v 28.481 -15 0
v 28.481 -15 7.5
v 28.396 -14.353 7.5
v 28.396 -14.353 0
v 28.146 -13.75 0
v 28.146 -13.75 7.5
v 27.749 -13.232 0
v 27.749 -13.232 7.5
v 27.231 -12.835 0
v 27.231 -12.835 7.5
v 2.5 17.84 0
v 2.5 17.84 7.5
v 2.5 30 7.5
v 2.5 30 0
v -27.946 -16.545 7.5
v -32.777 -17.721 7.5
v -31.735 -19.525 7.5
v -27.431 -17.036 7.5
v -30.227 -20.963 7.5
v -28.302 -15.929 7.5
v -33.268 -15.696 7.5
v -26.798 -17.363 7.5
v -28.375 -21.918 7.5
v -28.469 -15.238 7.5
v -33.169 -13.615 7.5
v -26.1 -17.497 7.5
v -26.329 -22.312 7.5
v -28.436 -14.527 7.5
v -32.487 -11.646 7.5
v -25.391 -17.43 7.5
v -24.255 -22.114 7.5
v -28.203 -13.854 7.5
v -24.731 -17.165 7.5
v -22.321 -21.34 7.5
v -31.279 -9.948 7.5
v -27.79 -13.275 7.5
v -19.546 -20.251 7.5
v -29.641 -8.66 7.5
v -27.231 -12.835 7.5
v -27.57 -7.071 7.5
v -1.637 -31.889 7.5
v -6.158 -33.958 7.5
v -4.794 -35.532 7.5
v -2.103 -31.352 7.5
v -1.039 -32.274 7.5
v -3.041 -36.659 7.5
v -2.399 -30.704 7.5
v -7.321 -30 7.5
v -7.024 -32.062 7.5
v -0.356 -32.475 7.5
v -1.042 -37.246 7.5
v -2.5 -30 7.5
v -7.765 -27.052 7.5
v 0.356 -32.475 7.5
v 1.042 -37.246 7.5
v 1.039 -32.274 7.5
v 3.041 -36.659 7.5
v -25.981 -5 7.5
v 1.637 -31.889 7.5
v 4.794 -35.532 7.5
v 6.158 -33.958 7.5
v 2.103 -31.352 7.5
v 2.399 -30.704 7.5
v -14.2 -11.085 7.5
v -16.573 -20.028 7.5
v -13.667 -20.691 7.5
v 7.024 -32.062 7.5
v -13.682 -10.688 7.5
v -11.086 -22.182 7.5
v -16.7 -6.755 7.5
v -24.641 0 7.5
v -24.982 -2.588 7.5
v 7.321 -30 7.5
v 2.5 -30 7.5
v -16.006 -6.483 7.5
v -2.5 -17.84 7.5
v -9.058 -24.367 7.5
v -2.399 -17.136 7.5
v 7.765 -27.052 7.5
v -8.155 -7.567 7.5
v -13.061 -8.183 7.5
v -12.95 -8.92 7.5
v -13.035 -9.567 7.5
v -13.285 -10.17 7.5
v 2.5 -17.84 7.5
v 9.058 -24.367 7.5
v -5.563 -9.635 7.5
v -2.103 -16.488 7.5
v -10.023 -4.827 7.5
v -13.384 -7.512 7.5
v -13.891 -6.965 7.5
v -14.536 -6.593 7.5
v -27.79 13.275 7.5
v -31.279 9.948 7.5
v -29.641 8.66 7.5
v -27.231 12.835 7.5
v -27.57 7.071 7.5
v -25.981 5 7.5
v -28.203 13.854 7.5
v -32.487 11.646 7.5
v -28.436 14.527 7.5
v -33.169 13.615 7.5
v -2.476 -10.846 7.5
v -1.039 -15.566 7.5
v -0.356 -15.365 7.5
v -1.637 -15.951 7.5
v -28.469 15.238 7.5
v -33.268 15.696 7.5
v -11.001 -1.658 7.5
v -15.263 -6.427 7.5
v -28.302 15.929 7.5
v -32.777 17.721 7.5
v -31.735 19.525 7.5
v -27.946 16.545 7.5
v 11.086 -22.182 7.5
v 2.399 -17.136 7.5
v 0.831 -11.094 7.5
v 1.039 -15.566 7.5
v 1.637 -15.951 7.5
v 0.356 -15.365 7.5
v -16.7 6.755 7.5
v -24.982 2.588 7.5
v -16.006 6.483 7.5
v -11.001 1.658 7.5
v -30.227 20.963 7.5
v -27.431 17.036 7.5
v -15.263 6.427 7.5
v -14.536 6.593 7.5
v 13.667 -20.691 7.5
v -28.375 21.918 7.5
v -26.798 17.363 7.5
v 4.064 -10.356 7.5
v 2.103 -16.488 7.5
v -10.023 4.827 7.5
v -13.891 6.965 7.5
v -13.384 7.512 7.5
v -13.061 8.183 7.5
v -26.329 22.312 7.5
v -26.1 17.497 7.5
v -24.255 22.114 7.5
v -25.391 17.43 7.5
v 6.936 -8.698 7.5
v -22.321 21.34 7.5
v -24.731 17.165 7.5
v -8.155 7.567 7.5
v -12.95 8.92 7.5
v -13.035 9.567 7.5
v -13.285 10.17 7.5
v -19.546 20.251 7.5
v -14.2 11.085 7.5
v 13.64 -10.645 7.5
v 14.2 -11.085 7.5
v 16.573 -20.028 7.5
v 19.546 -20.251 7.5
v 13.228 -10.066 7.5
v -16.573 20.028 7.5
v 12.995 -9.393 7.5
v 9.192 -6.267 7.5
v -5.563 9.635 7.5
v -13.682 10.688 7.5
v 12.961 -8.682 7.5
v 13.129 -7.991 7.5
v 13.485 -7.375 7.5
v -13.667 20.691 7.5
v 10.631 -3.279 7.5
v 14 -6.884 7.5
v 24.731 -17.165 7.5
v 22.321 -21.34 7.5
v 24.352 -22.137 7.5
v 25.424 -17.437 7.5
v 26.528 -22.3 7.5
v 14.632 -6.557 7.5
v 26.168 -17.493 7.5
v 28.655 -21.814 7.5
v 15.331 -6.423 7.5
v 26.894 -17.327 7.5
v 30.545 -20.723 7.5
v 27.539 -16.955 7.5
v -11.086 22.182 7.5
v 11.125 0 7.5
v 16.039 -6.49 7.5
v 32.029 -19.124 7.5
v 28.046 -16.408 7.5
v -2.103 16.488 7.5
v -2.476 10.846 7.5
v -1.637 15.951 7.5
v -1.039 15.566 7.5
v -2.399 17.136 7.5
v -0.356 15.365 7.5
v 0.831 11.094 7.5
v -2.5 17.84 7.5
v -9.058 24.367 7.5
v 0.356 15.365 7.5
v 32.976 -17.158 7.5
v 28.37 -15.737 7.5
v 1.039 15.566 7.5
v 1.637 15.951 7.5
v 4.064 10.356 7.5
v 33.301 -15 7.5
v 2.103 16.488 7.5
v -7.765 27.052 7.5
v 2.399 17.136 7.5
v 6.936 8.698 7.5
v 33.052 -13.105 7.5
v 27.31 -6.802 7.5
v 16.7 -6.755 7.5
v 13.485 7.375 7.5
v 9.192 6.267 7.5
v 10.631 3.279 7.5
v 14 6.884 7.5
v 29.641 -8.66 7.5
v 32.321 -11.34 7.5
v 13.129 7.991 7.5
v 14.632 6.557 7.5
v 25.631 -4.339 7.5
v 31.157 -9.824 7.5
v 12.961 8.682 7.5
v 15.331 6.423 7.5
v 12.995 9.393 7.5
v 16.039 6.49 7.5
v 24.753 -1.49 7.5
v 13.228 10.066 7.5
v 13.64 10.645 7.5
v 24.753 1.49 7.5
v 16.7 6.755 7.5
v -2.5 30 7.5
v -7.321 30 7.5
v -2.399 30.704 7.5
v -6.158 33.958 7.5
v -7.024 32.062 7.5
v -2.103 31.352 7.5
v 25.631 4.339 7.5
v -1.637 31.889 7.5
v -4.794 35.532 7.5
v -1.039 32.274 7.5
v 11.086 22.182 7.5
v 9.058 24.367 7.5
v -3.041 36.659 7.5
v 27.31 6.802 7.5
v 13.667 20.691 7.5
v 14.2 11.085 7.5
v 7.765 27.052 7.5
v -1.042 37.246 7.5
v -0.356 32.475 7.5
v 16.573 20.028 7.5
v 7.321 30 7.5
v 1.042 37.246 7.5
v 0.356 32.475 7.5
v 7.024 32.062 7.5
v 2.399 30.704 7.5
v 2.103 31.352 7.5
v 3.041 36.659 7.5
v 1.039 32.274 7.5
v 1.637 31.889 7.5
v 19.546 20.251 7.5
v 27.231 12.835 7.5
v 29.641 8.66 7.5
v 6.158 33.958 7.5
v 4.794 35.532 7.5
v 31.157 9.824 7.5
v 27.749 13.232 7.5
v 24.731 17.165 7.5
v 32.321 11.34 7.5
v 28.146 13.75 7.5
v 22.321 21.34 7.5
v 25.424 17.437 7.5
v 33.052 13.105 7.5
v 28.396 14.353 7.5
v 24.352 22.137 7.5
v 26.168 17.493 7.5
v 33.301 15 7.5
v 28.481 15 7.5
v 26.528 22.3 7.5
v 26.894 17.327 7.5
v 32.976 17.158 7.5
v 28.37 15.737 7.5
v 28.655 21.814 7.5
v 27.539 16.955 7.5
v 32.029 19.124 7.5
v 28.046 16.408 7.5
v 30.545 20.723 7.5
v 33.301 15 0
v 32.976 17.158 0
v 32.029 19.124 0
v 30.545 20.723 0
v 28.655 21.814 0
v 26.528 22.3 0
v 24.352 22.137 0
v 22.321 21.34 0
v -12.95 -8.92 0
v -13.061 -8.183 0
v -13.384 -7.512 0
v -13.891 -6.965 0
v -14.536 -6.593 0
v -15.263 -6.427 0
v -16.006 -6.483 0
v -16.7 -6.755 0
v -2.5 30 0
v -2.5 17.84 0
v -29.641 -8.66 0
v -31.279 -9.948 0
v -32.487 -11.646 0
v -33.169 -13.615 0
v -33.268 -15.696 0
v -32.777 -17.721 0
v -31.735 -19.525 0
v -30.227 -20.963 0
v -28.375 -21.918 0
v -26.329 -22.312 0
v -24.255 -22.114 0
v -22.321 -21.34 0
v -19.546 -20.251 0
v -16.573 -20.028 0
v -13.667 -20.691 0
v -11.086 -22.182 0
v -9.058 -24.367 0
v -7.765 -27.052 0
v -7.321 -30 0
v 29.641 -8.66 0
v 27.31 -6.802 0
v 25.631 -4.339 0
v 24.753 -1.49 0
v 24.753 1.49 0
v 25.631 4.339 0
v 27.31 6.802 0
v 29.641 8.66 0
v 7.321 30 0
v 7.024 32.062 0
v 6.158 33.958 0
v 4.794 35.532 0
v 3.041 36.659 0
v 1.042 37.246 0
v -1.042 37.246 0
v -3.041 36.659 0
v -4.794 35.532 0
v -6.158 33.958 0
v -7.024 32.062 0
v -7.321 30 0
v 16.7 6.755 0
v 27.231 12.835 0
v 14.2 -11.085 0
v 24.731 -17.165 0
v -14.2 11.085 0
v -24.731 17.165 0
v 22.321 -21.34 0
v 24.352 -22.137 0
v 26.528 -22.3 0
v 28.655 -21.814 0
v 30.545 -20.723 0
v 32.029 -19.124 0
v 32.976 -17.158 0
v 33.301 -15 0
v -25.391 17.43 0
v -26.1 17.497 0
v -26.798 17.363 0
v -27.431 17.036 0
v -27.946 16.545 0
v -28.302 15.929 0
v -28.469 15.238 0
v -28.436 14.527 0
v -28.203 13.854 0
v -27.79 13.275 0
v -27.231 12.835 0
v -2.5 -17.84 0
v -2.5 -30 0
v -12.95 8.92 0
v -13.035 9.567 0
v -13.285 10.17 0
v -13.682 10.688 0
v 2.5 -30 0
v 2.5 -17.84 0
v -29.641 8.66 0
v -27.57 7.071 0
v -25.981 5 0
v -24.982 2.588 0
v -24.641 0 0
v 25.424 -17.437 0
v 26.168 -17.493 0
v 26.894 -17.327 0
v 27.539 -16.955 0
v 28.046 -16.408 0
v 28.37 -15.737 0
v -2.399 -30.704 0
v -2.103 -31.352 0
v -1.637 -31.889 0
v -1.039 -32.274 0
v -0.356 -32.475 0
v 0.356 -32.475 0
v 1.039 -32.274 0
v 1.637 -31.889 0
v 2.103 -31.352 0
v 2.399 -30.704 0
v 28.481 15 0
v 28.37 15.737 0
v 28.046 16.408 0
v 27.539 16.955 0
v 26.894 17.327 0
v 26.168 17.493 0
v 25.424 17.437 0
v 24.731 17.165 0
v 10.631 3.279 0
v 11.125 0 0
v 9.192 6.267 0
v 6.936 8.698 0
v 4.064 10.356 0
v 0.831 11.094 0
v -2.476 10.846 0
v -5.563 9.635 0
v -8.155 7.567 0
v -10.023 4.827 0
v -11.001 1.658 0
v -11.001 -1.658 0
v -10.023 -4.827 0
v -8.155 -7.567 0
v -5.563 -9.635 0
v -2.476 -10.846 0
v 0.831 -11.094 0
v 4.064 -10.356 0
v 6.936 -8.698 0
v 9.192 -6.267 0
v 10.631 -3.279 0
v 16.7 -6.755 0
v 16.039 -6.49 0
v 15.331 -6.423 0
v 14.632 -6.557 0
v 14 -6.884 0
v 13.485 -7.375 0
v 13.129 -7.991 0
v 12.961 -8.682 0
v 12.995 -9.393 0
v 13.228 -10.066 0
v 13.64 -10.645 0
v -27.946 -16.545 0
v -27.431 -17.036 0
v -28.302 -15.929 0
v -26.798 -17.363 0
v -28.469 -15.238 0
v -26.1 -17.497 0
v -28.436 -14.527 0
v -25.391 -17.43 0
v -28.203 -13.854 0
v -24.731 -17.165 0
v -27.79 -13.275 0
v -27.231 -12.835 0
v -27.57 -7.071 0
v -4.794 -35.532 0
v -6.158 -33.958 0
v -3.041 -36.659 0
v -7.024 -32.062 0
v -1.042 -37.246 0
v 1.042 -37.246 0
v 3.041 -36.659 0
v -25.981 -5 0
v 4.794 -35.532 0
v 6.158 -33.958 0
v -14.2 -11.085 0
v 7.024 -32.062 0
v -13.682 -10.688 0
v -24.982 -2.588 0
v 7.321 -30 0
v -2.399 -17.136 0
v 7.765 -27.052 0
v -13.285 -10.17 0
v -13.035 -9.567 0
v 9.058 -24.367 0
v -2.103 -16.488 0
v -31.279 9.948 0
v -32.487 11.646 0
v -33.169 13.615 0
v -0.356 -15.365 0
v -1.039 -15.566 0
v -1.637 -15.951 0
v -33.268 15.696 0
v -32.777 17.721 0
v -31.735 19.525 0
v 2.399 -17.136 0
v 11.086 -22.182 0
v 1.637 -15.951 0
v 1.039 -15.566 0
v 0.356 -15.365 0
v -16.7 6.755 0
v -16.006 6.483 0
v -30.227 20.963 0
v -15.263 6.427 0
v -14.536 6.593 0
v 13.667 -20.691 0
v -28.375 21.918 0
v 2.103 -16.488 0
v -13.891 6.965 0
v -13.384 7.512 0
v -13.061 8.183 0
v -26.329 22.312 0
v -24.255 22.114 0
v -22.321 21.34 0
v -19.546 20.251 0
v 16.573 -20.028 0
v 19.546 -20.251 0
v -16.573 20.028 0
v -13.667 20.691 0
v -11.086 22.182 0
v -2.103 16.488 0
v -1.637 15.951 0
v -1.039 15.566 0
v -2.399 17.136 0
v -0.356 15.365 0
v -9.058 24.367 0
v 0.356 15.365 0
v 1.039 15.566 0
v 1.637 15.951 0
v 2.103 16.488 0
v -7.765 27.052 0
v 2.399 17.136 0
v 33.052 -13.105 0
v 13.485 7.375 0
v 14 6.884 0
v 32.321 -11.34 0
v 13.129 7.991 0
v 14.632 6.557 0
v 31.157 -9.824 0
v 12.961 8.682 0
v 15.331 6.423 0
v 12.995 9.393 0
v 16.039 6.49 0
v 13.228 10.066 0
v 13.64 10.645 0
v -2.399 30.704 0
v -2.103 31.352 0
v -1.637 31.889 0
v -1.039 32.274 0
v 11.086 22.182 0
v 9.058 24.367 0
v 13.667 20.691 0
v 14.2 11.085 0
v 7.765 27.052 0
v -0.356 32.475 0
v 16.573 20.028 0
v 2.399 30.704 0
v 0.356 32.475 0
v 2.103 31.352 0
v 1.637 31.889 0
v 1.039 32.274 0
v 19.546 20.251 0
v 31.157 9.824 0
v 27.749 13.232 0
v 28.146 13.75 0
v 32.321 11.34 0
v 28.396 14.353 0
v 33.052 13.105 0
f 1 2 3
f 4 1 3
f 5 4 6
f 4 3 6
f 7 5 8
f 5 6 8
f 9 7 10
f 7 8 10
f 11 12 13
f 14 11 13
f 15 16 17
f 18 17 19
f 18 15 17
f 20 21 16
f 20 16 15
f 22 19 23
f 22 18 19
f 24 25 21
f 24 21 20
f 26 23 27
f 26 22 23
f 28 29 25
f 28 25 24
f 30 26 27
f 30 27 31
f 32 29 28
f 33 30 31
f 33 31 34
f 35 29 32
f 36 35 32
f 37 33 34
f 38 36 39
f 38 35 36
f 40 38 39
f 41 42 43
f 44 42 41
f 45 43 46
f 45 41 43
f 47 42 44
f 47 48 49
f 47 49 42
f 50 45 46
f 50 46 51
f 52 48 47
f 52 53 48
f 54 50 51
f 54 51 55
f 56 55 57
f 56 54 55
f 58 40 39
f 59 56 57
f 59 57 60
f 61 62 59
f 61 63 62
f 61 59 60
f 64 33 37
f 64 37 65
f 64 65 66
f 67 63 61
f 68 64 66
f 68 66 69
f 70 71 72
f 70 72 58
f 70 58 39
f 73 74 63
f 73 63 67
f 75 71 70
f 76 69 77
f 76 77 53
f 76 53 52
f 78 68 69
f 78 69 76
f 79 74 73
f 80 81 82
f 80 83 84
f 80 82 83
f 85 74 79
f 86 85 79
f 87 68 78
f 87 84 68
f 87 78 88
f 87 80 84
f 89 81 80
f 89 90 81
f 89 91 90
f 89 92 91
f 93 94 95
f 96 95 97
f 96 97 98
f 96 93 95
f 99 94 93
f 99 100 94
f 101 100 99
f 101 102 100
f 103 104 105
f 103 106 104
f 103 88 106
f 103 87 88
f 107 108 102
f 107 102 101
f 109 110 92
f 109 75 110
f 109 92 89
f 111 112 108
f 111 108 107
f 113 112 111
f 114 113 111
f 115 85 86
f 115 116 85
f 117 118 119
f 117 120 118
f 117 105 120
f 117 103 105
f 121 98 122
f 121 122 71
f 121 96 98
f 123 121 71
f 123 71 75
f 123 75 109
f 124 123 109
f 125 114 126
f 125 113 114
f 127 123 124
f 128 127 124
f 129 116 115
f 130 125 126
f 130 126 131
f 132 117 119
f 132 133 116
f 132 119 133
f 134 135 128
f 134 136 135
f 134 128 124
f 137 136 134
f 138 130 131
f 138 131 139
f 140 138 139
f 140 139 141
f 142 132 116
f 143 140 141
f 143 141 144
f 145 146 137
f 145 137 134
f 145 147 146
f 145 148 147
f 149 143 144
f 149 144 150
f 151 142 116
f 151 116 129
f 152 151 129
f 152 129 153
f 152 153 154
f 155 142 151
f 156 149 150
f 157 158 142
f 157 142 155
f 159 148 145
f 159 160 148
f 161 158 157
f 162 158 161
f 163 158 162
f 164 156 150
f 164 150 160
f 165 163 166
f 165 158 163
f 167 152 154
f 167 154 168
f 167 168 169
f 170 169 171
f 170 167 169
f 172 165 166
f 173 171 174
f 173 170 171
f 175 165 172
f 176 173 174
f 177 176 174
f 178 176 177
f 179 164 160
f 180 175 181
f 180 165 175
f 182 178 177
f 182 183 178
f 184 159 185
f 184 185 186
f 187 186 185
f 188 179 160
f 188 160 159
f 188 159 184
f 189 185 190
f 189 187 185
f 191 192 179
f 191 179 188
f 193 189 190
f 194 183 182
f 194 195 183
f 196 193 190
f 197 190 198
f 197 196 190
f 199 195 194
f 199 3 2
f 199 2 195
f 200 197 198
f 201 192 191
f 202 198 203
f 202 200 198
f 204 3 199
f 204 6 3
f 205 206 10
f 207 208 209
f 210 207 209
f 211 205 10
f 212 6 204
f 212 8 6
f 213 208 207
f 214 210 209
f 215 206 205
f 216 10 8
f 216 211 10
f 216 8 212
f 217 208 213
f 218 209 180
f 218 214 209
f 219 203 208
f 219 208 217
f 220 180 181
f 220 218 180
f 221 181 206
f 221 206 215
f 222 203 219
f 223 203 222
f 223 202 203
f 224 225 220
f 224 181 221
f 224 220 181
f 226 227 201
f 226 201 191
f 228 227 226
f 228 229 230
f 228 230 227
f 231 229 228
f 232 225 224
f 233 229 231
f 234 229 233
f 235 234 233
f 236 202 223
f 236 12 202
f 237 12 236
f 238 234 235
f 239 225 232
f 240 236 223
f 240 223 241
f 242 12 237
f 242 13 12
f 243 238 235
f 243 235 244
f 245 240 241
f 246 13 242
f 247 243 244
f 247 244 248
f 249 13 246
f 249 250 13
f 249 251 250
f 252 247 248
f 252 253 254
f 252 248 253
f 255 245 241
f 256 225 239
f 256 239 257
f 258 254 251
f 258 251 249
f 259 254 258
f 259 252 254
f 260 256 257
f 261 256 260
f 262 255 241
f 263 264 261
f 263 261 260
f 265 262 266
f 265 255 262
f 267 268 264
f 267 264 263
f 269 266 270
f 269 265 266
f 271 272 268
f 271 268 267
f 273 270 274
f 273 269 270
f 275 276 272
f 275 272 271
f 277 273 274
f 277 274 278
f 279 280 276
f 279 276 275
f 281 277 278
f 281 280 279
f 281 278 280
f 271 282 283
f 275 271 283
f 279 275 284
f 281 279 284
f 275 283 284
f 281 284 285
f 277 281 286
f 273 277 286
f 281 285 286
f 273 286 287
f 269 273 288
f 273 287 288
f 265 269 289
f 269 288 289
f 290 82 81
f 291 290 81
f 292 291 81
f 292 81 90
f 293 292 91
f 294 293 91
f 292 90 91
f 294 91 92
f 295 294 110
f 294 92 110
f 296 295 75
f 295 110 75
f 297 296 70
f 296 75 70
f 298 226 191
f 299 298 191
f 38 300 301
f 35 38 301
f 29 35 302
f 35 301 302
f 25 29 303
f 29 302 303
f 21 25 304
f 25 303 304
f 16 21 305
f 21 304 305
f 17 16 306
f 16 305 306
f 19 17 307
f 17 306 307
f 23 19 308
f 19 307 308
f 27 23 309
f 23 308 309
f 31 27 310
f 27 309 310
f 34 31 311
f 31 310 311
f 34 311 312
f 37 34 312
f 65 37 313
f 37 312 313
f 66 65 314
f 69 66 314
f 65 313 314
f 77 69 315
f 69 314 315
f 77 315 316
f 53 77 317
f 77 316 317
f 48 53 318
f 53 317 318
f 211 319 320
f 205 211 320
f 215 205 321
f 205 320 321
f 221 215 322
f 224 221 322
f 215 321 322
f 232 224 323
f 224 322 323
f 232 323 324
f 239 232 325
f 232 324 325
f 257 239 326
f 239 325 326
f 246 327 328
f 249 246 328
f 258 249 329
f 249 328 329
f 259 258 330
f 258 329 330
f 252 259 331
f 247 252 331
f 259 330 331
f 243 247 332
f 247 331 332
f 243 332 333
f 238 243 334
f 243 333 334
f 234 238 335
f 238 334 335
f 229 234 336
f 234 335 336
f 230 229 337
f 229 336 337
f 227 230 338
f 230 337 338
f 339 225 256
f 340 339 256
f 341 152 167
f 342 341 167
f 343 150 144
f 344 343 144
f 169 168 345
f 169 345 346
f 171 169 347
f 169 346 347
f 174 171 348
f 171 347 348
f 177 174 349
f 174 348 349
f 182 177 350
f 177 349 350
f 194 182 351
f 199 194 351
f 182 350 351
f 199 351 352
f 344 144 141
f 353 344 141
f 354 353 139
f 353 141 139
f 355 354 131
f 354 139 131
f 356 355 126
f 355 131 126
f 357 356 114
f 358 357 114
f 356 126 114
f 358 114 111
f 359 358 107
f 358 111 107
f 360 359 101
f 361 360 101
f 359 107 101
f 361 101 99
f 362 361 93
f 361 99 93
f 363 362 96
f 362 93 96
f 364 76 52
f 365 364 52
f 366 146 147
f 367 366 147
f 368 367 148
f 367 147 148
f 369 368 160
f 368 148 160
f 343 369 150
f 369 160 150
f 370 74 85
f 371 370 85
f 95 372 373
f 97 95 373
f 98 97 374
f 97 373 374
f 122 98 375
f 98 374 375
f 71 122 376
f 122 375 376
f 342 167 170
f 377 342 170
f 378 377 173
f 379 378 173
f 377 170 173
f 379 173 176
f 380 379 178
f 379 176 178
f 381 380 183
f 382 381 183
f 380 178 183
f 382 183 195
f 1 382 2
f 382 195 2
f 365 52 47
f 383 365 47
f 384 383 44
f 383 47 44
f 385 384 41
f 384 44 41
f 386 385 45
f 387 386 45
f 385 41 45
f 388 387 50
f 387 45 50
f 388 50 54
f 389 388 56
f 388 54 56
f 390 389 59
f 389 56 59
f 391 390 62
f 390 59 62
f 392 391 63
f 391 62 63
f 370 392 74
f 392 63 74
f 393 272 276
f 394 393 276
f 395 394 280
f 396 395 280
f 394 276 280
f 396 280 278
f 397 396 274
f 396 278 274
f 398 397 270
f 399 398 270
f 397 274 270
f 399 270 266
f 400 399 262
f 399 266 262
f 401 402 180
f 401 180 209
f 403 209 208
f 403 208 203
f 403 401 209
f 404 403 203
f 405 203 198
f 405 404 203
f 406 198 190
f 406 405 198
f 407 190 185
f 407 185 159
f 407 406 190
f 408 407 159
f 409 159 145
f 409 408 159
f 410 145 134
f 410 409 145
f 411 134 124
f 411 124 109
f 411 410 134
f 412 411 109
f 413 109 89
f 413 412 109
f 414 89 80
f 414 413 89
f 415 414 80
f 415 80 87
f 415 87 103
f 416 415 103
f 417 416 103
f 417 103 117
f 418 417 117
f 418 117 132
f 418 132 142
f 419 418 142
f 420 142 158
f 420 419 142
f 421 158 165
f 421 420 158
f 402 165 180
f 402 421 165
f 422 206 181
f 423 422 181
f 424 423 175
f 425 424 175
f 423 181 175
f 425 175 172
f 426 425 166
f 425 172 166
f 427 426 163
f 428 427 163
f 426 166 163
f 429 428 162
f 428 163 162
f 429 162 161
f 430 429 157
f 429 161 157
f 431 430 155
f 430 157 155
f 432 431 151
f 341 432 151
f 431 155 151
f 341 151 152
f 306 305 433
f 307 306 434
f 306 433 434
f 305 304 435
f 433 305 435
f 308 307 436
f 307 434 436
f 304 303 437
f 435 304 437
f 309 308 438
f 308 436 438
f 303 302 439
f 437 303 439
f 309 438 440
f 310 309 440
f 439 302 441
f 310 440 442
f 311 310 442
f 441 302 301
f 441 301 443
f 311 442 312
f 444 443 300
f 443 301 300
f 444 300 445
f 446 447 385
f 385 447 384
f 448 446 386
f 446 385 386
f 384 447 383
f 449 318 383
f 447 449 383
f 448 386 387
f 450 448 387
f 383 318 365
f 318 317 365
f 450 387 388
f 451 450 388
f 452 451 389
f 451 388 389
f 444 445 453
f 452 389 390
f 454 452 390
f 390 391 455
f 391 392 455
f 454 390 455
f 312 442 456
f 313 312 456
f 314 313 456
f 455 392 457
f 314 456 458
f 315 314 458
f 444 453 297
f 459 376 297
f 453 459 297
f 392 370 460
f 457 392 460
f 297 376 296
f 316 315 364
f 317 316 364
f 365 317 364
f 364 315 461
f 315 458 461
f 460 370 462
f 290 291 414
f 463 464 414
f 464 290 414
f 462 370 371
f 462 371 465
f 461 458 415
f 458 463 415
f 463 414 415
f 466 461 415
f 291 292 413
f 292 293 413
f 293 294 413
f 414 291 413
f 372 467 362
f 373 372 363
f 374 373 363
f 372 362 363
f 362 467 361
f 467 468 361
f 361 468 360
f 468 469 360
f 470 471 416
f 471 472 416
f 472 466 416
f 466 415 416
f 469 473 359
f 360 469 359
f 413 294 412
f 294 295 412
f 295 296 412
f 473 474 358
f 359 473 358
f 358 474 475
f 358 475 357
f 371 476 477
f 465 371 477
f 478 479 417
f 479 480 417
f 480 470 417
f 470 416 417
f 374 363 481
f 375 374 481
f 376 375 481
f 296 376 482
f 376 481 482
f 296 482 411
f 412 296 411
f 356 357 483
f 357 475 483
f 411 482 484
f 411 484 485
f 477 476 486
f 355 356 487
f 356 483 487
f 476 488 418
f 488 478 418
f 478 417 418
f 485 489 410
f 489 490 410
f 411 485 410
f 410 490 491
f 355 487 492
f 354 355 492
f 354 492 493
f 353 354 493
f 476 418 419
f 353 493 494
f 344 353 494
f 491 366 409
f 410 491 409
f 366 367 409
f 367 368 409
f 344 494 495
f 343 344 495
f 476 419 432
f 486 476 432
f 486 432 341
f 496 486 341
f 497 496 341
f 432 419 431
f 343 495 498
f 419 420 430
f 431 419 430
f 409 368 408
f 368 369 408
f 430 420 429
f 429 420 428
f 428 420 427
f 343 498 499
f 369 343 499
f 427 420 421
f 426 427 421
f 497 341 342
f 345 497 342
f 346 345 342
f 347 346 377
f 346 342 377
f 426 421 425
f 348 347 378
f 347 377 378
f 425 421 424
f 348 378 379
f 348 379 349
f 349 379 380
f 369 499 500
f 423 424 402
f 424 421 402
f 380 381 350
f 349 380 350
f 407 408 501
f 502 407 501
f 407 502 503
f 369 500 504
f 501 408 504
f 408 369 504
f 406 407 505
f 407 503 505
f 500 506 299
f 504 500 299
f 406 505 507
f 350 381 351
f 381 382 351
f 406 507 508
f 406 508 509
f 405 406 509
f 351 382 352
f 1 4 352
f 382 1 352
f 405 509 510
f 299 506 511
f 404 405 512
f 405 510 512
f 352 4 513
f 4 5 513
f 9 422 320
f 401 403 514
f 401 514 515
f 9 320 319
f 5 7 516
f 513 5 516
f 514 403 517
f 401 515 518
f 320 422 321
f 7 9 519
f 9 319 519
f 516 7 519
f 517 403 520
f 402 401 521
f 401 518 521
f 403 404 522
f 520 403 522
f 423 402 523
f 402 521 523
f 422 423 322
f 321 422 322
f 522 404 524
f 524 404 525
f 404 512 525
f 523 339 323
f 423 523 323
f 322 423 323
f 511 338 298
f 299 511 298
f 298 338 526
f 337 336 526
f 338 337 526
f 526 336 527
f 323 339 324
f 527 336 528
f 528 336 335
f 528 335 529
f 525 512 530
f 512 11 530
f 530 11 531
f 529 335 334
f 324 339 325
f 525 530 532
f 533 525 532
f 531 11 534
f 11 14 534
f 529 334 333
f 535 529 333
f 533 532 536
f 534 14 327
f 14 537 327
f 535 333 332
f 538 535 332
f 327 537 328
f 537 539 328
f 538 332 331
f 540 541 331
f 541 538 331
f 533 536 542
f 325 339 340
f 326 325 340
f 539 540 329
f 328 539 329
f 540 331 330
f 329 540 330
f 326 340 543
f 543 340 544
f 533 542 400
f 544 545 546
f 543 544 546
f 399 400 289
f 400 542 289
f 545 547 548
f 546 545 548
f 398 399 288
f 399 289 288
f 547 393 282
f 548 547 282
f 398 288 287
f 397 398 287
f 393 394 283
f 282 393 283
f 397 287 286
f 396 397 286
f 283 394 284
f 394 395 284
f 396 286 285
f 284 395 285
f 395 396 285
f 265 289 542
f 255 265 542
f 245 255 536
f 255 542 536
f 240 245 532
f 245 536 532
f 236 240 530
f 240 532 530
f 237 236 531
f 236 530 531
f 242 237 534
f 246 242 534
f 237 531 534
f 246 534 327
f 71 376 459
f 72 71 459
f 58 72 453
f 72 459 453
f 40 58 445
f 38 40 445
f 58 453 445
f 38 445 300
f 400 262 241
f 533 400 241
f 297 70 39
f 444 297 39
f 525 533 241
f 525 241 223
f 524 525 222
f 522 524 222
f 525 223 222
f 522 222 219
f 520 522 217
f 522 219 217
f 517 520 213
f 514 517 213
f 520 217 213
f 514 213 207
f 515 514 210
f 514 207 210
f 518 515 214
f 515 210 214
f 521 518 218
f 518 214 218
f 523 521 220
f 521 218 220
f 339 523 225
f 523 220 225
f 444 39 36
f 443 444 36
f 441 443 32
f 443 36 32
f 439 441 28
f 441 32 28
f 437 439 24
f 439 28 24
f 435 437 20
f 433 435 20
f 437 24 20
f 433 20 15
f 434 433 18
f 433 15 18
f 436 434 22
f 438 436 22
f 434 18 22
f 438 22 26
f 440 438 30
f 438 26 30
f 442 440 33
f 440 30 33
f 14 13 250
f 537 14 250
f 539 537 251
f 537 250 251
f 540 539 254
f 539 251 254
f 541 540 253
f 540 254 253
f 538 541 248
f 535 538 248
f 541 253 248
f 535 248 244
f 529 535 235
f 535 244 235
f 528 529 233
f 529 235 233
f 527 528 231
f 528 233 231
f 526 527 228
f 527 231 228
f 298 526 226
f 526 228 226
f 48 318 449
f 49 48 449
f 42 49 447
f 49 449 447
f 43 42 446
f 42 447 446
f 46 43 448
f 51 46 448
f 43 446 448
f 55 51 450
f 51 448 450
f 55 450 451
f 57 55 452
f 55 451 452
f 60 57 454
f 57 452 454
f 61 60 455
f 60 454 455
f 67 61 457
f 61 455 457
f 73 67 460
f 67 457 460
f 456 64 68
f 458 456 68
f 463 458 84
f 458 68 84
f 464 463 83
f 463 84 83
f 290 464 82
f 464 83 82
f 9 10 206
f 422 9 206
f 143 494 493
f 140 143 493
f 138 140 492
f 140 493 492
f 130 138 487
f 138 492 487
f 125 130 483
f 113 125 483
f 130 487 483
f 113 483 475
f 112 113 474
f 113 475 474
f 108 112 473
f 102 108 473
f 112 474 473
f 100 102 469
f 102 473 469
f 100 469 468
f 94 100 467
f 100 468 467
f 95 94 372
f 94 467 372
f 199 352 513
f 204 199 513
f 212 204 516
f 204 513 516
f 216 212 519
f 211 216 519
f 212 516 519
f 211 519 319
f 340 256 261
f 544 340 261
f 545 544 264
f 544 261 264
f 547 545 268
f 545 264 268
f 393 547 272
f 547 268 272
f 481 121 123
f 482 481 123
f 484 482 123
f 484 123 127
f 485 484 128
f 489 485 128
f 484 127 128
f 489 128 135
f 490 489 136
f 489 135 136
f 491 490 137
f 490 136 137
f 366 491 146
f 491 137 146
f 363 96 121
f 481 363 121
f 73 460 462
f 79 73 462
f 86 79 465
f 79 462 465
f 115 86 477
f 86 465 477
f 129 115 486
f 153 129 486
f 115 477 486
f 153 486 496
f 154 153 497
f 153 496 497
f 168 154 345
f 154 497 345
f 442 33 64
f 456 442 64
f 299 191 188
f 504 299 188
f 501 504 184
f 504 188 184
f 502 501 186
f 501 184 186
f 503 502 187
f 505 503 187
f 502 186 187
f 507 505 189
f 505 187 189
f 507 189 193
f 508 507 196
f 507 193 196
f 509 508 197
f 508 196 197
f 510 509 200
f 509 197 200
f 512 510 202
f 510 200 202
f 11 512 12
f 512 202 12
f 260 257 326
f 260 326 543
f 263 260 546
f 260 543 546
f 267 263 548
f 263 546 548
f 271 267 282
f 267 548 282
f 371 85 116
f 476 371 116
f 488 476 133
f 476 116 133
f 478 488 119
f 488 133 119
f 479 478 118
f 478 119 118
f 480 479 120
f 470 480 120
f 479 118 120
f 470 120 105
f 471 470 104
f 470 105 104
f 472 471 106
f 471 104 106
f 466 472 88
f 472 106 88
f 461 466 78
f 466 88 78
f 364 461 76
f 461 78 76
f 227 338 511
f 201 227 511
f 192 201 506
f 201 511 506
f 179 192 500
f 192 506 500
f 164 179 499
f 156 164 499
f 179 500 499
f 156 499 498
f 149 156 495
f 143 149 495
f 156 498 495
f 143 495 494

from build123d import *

# Parameters (mm, degrees)
F0_R     = 11.125
F1_DEPTH = 7.5
F3_DEPTH = 25


with BuildPart() as f1:
    # F0 (on Top) → F1 (new body)
    with BuildSketch(Plane.XY):
        with BuildLine():
            ThreePointArc((7.3205080757, 30), (0, 22.6794919243), (-7.3205080757, 30))
            ThreePointArc((-7.3205080757, 30), (-12.3205080803, 21.3397459595), (-22.3205080849, 21.3397459675))
            ThreePointArc((-22.3205080849, 21.3397459675), (-19.641016154, 18.6602540424), (-18.6602540378, 15))
            ThreePointArc((-18.6602540378, 15), (-22.3205080792, 8.6602540358), (-29.6410161584, 8.6602540419))
            ThreePointArc((-29.6410161584, 8.6602540419), (-25.9807621156, 5.0000000035), (-24.6410161514, 0))
            ThreePointArc((-24.6410161514, 0), (-25.9807621131, -4.9999999992), (-29.6410161498, -8.660254037))
            ThreePointArc((-29.6410161498, -8.660254037), (-22.3205080749, -8.6602540383), (-18.6602540378, -15))
            ThreePointArc((-18.6602540378, -15), (-19.6410161418, -18.6602540212), (-22.3205080425, -21.339745943))
            ThreePointArc((-22.3205080425, -21.339745943), (-12.3205080591, -21.3397459717), (-7.3205080757, -30))
            ThreePointArc((-7.3205080757, -30), (0, -22.6794919243), (7.3205080757, -30))
            ThreePointArc((7.3205080757, -30), (12.3205080629, -21.3397459695), (22.3205080502, -21.3397459474))
            ThreePointArc((22.3205080502, -21.3397459474), (19.6410161514, -11.3397459622), (29.6410161259, -8.6602540231))
            ThreePointArc((29.6410161259, -8.6602540231), (24.6410161514, -3.02e-08), (29.6410160736, 8.6602539929))
            ThreePointArc((29.6410160736, 8.6602539929), (19.641016124, 11.3397460095), (22.3205080926, 21.3397459719))
            ThreePointArc((22.3205080926, 21.3397459719), (12.3205080841, 21.3397459573), (7.3205080757, 30))
        make_face()
        Circle(F0_R, mode=Mode.SUBTRACT)
        with BuildLine():
            Line((7.3205080757, 30), (-7.3205080757, 30))
            ThreePointArc((-7.3205080757, 30), (0, 22.6794919243), (7.3205080757, 30))
        make_face()
        with BuildLine():
            ThreePointArc((7.3205080757, 30), (0, 37.3205080757), (-7.3205080757, 30))
            Line((-7.3205080757, 30), (7.3205080757, 30))
        make_face()
        with BuildLine():
            ThreePointArc((-18.6602540378, 15), (-19.641016154, 18.6602540424), (-22.3205080849, 21.3397459675))
            Line((-22.3205080757, 21.3397459622), (-29.6410161514, 8.6602540378))
            ThreePointArc((-29.6410161584, 8.6602540419), (-22.3205080792, 8.6602540358), (-18.6602540378, 15))
        make_face()
        with BuildLine():
            Line((-29.6410161514, 8.6602540378), (-22.3205080757, 21.3397459622))
            ThreePointArc((-22.3205080849, 21.3397459675), (-32.3205080763, 18.6602540368), (-29.6410161584, 8.6602540419))
        make_face()
        with BuildLine():
            ThreePointArc((-18.6602540378, -15), (-22.3205080749, -8.6602540383), (-29.6410161498, -8.660254037))
            Line((-29.6410161514, -8.6602540378), (-22.3205080757, -21.3397459622))
            ThreePointArc((-22.3205080425, -21.339745943), (-19.6410161418, -18.6602540212), (-18.6602540378, -15))
        make_face()
        with BuildLine():
            Line((-22.3205080757, -21.3397459622), (-29.6410161514, -8.6602540378))
            ThreePointArc((-29.6410161498, -8.660254037), (-32.3205080665, -18.6602540537), (-22.3205080425, -21.339745943))
        make_face()
        with BuildLine():
            Line((7.3205080757, -30), (-7.3205080757, -30))
            ThreePointArc((-7.3205080757, -30), (0, -37.3205080757), (7.3205080757, -30))
        make_face()
        with BuildLine():
            ThreePointArc((7.3205080757, -30), (0, -22.6794919243), (-7.3205080757, -30))
            Line((-7.3205080757, -30), (7.3205080757, -30))
        make_face()
        with BuildLine():
            Line((22.3205080757, -21.3397459622), (29.6410161514, -8.6602540378))
            ThreePointArc((29.6410161259, -8.6602540231), (19.6410161514, -11.3397459622), (22.3205080502, -21.3397459474))
        make_face()
        with BuildLine():
            ThreePointArc((33.3012701892, -15), (32.3205080683, -11.3397459494), (29.6410161259, -8.6602540231))
            Line((29.6410161514, -8.6602540378), (22.3205080757, -21.3397459622))
            ThreePointArc((22.3205080502, -21.3397459474), (29.6410161386, -21.3397459695), (33.3012701892, -15))
        make_face()
        with BuildLine():
            Line((29.6410161514, 8.6602540378), (22.3205080757, 21.3397459622))
            ThreePointArc((22.3205080926, 21.3397459719), (19.641016124, 11.3397460095), (29.6410160736, 8.6602539929))
        make_face()
        with BuildLine():
            ThreePointArc((33.3012701892, 15), (29.6410161598, 21.3397459573), (22.3205080926, 21.3397459719))
            Line((22.3205080757, 21.3397459622), (29.6410161514, 8.6602540378))
            ThreePointArc((29.6410160736, 8.6602539929), (32.3205080532, 11.3397459232), (33.3012701892, 15))
        make_face()
    extrude(amount=F1_DEPTH)

    # F2 (on face) → F3 (cut)
    with BuildSketch(Plane.XY.offset(7.5)):
        with BuildLine():
            ThreePointArc((-2.5, 17.8399104625), (0, 15.3399104625), (2.5, 17.8399104625))
            ThreePointArc((2.5, 17.8399104625), (0, 20.3399104625), (-2.5, 17.8399104625))
        make_face()
        with BuildLine():
            Line((2.5, 17.8399104625), (2.5, 30))
            ThreePointArc((2.5, 30), (0, 27.5), (-2.5, 30))
            Line((-2.5, 30), (-2.5, 17.8399104625))
            ThreePointArc((-2.5, 17.8399104625), (0, 20.3399104625), (2.5, 17.8399104625))
        make_face()
        with BuildLine():
            ThreePointArc((-2.5, 30), (0, 27.5), (2.5, 30))
            ThreePointArc((2.5, 30), (0, 32.5), (-2.5, 30))
        make_face()
        with BuildLine():
            ThreePointArc((-24.7307621135, 17.1650635095), (-23.8156986041, 16.25), (-23.4807621135, 15))
            ThreePointArc((-23.4807621135, 15), (-24.7307621135, 12.8349364905), (-27.2307621135, 12.8349364905))
            Line((-27.2307621135, 12.8349364905), (-16.6998156618, 6.7548917218))
            ThreePointArc((-16.6998156618, 6.7548917218), (-17.6148791712, 10.1699552312), (-14.1998156618, 11.0850187407))
            Line((-14.1998156618, 11.0850187407), (-24.7307621135, 17.1650635095))
        make_face()
        with BuildLine():
            ThreePointArc((-12.9498156618, 8.9199552312), (-13.2847521523, 10.1699552312), (-14.1998156618, 11.0850187407))
            ThreePointArc((-14.1998156618, 11.0850187407), (-17.6148791712, 10.1699552312), (-16.6998156618, 6.7548917218))
            ThreePointArc((-16.6998156618, 6.7548917218), (-14.1998156618, 6.7548917218), (-12.9498156618, 8.9199552312))
        make_face()
        with BuildLine():
            ThreePointArc((-27.2307621135, 12.8349364905), (-24.7307621135, 12.8349364905), (-23.4807621135, 15))
            ThreePointArc((-23.4807621135, 15), (-23.8156986041, 16.25), (-24.7307621135, 17.1650635095))
            ThreePointArc((-24.7307621135, 17.1650635095), (-28.145825623, 16.25), (-27.2307621135, 12.8349364905))
        make_face()
        with BuildLine():
            ThreePointArc((-27.2307621135, -12.8349364905), (-24.7307621135, -12.8349364905), (-23.4807621135, -15))
            ThreePointArc((-23.4807621135, -15), (-23.8156986041, -16.25), (-24.7307621135, -17.1650635095))
            Line((-24.7307621135, -17.1650635095), (-14.1998156618, -11.0850187407))
            ThreePointArc((-14.1998156618, -11.0850187407), (-17.6148791712, -10.1699552312), (-16.6998156618, -6.7548917218))
            Line((-16.6998156618, -6.7548917218), (-27.2307621135, -12.8349364905))
        make_face()
        with BuildLine():
            ThreePointArc((-12.9498156618, -8.9199552312), (-14.1998156618, -6.7548917218), (-16.6998156618, -6.7548917218))
            ThreePointArc((-16.6998156618, -6.7548917218), (-17.6148791712, -10.1699552312), (-14.1998156618, -11.0850187407))
            ThreePointArc((-14.1998156618, -11.0850187407), (-13.2847521523, -10.1699552312), (-12.9498156618, -8.9199552312))
        make_face()
        with BuildLine():
            ThreePointArc((-24.7307621135, -17.1650635095), (-23.8156986041, -16.25), (-23.4807621135, -15))
            ThreePointArc((-23.4807621135, -15), (-24.7307621135, -12.8349364905), (-27.2307621135, -12.8349364905))
            ThreePointArc((-27.2307621135, -12.8349364905), (-28.145825623, -16.25), (-24.7307621135, -17.1650635095))
        make_face()
        with BuildLine():
            ThreePointArc((-2.5, -30), (0, -27.5), (2.5, -30))
            Line((2.5, -30), (2.5, -17.8399104625))
            ThreePointArc((2.5, -17.8399104625), (0, -20.3399104625), (-2.5, -17.8399104625))
            Line((-2.5, -17.8399104625), (-2.5, -30))
        make_face()
        with BuildLine():
            ThreePointArc((-2.5, -17.8399104625), (0, -20.3399104625), (2.5, -17.8399104625))
            ThreePointArc((2.5, -17.8399104625), (0, -15.3399104625), (-2.5, -17.8399104625))
        make_face()
        with BuildLine():
            ThreePointArc((-2.5, -30), (0, -32.5), (2.5, -30))
            ThreePointArc((2.5, -30), (0, -27.5), (-2.5, -30))
        make_face()
        with BuildLine():
            ThreePointArc((24.7307621135, -17.1650635095), (23.8156986041, -13.75), (27.2307621135, -12.8349364905))
            Line((27.2307621135, -12.8349364905), (16.6998156618, -6.7548917218))
            ThreePointArc((16.6998156618, -6.7548917218), (17.6148791712, -7.6699552312), (17.9498156618, -8.9199552312))
            ThreePointArc((17.9498156618, -8.9199552312), (16.6998156618, -11.0850187407), (14.1998156618, -11.0850187407))
            Line((14.1998156618, -11.0850187407), (24.7307621135, -17.1650635095))
        make_face()
        with BuildLine():
            ThreePointArc((17.9498156618, -8.9199552312), (17.6148791712, -7.6699552312), (16.6998156618, -6.7548917218))
            ThreePointArc((16.6998156618, -6.7548917218), (13.2847521523, -7.6699552312), (14.1998156618, -11.0850187407))
            ThreePointArc((14.1998156618, -11.0850187407), (16.6998156618, -11.0850187407), (17.9498156618, -8.9199552312))
        make_face()
        with BuildLine():
            ThreePointArc((24.7307621135, -17.1650635095), (27.2307621135, -17.1650635095), (28.4807621135, -15))
            ThreePointArc((28.4807621135, -15), (28.145825623, -13.75), (27.2307621135, -12.8349364905))
            ThreePointArc((27.2307621135, -12.8349364905), (23.8156986041, -13.75), (24.7307621135, -17.1650635095))
        make_face()
        with BuildLine():
            ThreePointArc((27.2307621135, 12.8349364905), (23.8156986041, 13.75), (24.7307621135, 17.1650635095))
            Line((24.7307621135, 17.1650635095), (14.1998156618, 11.0850187407))
            ThreePointArc((14.1998156618, 11.0850187407), (16.6998156618, 11.0850187407), (17.9498156618, 8.9199552312))
            ThreePointArc((17.9498156618, 8.9199552312), (17.6148791712, 7.6699552312), (16.6998156618, 6.7548917218))
            Line((16.6998156618, 6.7548917218), (27.2307621135, 12.8349364905))
        make_face()
        with BuildLine():
            ThreePointArc((17.9498156618, 8.9199552312), (16.6998156618, 11.0850187407), (14.1998156618, 11.0850187407))
            ThreePointArc((14.1998156618, 11.0850187407), (13.2847521523, 7.6699552312), (16.6998156618, 6.7548917218))
            ThreePointArc((16.6998156618, 6.7548917218), (17.6148791712, 7.6699552312), (17.9498156618, 8.9199552312))
        make_face()
        with BuildLine():
            ThreePointArc((27.2307621135, 12.8349364905), (28.145825623, 13.75), (28.4807621135, 15))
            ThreePointArc((28.4807621135, 15), (27.2307621135, 17.1650635095), (24.7307621135, 17.1650635095))
            ThreePointArc((24.7307621135, 17.1650635095), (23.8156986041, 13.75), (27.2307621135, 12.8349364905))
        make_face()
    extrude(amount=-F3_DEPTH, mode=Mode.SUBTRACT)


solid = f1.part
